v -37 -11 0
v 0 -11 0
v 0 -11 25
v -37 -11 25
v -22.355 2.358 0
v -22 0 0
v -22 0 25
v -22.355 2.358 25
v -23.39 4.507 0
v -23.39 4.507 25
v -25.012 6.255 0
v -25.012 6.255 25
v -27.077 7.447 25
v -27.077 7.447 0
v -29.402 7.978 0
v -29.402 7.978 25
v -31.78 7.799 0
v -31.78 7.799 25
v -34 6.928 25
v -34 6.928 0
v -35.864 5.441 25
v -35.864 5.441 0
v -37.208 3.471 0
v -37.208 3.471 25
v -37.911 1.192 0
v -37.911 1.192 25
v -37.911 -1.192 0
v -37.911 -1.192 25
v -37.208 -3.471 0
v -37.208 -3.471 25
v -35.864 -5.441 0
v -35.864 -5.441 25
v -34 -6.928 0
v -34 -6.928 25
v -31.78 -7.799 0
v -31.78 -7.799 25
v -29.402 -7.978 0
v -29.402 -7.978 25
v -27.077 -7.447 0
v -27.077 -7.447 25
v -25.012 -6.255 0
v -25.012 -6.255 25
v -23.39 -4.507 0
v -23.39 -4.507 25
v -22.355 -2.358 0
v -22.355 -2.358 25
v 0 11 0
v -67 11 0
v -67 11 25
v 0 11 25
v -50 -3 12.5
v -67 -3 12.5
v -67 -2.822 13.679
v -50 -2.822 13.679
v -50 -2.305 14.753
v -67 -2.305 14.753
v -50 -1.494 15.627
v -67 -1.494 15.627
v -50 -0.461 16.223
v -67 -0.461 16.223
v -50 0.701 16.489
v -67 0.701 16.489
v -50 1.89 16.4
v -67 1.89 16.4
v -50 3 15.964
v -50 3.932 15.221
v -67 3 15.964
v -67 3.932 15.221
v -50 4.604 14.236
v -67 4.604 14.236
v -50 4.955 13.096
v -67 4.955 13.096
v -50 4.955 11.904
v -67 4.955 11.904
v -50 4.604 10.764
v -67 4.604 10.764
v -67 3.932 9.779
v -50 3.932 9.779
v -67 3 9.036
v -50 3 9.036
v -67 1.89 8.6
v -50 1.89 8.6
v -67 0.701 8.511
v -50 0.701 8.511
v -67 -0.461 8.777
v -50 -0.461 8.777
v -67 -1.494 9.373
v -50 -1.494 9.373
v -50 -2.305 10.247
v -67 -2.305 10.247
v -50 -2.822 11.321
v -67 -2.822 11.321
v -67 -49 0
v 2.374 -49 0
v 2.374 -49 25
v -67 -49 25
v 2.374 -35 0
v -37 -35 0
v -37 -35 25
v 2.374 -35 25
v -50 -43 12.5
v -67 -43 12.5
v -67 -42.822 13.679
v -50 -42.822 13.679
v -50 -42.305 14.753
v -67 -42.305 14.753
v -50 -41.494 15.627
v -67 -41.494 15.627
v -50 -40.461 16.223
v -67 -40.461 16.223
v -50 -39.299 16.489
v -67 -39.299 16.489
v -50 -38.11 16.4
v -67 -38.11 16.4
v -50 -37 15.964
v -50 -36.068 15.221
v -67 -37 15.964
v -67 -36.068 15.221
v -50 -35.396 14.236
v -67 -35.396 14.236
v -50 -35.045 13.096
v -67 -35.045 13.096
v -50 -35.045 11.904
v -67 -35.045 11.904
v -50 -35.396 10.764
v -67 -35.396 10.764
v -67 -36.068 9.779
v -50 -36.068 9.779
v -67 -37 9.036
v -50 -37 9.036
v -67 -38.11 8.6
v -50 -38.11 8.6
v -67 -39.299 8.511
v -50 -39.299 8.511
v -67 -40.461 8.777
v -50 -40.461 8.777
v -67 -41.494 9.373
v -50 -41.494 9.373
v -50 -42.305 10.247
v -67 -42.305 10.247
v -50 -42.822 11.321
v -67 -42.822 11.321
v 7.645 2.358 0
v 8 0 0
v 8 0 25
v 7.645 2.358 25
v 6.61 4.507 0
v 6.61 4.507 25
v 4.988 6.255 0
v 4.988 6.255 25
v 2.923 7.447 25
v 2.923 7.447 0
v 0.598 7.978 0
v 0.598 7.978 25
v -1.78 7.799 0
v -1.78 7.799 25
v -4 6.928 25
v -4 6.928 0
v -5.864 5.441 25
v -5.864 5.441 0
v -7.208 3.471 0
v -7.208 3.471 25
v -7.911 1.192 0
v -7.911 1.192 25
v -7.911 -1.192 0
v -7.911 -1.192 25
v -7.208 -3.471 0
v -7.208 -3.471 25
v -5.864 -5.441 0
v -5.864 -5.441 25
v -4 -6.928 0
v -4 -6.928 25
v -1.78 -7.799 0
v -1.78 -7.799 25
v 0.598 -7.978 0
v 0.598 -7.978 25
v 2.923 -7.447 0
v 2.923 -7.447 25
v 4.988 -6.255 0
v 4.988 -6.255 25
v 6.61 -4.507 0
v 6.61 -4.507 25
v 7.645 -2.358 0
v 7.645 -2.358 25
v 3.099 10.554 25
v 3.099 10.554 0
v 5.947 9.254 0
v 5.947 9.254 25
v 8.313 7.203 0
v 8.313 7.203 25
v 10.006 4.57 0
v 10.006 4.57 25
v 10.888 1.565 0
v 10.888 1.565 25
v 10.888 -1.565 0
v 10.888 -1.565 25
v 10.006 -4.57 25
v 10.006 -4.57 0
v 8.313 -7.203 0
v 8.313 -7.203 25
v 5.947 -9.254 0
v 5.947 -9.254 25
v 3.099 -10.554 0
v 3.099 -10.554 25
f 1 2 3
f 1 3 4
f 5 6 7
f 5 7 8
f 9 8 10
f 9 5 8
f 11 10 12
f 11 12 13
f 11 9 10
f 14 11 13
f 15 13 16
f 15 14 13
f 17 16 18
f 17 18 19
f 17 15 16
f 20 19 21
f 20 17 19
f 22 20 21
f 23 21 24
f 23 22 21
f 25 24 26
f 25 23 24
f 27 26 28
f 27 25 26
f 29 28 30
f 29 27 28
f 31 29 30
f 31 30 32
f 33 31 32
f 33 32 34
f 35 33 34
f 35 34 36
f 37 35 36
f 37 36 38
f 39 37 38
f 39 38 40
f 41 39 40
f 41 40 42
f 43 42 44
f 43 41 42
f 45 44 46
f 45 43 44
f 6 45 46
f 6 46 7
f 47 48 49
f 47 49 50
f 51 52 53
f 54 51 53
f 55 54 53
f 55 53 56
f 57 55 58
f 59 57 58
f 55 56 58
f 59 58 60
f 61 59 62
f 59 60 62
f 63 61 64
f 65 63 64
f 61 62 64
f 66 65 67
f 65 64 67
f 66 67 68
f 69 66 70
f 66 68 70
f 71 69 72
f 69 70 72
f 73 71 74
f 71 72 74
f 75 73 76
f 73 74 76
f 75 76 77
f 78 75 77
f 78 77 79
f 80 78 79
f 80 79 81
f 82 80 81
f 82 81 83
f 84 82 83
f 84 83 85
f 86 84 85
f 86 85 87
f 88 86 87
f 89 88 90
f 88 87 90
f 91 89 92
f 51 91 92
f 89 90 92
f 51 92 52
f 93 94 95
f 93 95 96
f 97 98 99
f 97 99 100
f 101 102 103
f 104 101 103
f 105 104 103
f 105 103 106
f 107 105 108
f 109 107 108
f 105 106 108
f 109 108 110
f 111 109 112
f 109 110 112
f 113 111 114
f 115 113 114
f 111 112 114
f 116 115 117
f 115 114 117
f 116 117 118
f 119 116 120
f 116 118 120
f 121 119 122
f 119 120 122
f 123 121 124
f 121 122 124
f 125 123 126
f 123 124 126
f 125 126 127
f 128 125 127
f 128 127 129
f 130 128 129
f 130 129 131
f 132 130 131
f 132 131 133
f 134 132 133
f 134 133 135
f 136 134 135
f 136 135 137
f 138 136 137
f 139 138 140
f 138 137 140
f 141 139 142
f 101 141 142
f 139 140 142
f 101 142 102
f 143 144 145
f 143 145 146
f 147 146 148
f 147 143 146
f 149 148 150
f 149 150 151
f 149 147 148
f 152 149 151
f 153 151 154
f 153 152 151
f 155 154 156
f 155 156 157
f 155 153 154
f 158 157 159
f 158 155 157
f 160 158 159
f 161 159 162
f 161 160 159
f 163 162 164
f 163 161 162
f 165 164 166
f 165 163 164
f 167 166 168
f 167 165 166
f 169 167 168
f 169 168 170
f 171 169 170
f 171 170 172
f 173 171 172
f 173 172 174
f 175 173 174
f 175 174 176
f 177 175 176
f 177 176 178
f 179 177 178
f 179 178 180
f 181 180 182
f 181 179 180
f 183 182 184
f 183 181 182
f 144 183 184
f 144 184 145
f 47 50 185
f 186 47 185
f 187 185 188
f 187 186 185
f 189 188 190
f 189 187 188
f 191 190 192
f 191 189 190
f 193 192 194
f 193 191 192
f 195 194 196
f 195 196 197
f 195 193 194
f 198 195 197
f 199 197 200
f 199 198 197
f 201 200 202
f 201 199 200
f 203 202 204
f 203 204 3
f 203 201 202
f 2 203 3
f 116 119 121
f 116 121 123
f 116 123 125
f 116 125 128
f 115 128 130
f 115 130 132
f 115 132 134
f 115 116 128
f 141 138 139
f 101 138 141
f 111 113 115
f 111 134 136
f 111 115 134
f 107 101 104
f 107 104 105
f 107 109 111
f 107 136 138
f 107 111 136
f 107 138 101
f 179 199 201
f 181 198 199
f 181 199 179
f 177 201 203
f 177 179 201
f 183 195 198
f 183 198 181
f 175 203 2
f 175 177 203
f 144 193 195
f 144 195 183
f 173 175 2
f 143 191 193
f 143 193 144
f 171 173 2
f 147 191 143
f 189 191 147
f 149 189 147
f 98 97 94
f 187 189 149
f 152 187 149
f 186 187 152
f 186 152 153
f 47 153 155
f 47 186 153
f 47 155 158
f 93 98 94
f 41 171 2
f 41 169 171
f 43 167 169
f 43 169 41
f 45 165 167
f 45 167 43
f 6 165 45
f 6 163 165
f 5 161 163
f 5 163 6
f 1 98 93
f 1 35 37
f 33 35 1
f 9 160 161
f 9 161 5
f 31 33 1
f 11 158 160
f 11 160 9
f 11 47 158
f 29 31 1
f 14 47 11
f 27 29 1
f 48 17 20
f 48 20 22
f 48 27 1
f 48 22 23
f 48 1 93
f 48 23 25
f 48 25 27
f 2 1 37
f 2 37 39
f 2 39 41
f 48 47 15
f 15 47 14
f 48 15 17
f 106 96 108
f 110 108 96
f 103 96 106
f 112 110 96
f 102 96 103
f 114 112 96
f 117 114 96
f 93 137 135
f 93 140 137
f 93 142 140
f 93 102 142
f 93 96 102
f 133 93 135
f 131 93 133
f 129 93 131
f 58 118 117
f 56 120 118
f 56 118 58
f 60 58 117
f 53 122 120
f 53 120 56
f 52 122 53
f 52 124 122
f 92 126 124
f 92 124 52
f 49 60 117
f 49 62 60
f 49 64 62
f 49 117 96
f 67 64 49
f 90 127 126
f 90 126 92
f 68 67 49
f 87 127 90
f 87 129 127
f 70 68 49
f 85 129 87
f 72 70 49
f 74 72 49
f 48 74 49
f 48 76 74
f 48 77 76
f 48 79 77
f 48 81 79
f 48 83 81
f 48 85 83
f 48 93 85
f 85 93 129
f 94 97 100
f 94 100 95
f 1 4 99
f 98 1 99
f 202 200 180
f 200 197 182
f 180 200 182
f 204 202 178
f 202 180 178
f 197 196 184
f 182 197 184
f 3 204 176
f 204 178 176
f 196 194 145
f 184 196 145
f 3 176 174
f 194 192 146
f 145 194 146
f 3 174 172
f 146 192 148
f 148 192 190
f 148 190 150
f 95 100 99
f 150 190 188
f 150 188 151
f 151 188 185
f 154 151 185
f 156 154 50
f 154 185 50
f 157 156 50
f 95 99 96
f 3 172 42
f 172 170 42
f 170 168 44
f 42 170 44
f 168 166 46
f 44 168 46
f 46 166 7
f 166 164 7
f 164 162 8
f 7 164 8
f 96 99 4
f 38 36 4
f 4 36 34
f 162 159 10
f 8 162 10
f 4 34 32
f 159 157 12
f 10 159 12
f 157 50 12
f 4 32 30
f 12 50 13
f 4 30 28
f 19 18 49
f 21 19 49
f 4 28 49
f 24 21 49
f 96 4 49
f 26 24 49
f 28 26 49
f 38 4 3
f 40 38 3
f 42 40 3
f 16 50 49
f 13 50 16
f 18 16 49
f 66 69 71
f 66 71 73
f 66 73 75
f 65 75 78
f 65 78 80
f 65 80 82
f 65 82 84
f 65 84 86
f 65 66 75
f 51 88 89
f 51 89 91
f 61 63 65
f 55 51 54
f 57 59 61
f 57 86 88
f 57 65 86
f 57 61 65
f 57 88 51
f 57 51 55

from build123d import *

# Parameters (mm, degrees)
SKETCH1_R           = 8
BOSS_EXTRUDE1_DEPTH = 25
SKETCH2_R           = 4
CUT_EXTRUDE1_DEPTH  = 17


with BuildPart() as part:
    # Sketch1 → Boss-Extrude1 (new body)
    with BuildSketch(Plane.XY):
        with BuildLine():
            Line((-30, 11), (0, 11))
            ThreePointArc((0, 11), (11, 0), (0, -11))
            Line((0, -11), (-30, -11))
            Line((-30, -11), (-37, -11))
            Line((-37, -11), (-37, -35))
            Line((-37, -35), (2.374237314, -35))
            Line((2.374237314, -35), (2.374237314, -49))
            Line((2.374237314, -49), (-37, -49))
            Line((-37, -49), (-67, -49))
            Line((-67, -49), (-67, 11))
            Line((-67, 11), (-30, 11))
        make_face()
        Circle(SKETCH1_R, mode=Mode.SUBTRACT)
        with Locations((-30, 0)):
            Circle(SKETCH1_R, mode=Mode.SUBTRACT)
    extrude(amount=BOSS_EXTRUDE1_DEPTH)

    # Sketch2 → Cut-Extrude1 (cut)
    with BuildSketch(Plane.ZY.offset(67)):
        with Locations(Location((12.5, 1, 0), (0, 0, 270))):
            Circle(SKETCH2_R)
        with Locations(Location((12.5, -39, 0), (0, 0, 270))):
            Circle(SKETCH2_R)
    extrude(amount=-CUT_EXTRUDE1_DEPTH, mode=Mode.SUBTRACT)


solid = part.part
